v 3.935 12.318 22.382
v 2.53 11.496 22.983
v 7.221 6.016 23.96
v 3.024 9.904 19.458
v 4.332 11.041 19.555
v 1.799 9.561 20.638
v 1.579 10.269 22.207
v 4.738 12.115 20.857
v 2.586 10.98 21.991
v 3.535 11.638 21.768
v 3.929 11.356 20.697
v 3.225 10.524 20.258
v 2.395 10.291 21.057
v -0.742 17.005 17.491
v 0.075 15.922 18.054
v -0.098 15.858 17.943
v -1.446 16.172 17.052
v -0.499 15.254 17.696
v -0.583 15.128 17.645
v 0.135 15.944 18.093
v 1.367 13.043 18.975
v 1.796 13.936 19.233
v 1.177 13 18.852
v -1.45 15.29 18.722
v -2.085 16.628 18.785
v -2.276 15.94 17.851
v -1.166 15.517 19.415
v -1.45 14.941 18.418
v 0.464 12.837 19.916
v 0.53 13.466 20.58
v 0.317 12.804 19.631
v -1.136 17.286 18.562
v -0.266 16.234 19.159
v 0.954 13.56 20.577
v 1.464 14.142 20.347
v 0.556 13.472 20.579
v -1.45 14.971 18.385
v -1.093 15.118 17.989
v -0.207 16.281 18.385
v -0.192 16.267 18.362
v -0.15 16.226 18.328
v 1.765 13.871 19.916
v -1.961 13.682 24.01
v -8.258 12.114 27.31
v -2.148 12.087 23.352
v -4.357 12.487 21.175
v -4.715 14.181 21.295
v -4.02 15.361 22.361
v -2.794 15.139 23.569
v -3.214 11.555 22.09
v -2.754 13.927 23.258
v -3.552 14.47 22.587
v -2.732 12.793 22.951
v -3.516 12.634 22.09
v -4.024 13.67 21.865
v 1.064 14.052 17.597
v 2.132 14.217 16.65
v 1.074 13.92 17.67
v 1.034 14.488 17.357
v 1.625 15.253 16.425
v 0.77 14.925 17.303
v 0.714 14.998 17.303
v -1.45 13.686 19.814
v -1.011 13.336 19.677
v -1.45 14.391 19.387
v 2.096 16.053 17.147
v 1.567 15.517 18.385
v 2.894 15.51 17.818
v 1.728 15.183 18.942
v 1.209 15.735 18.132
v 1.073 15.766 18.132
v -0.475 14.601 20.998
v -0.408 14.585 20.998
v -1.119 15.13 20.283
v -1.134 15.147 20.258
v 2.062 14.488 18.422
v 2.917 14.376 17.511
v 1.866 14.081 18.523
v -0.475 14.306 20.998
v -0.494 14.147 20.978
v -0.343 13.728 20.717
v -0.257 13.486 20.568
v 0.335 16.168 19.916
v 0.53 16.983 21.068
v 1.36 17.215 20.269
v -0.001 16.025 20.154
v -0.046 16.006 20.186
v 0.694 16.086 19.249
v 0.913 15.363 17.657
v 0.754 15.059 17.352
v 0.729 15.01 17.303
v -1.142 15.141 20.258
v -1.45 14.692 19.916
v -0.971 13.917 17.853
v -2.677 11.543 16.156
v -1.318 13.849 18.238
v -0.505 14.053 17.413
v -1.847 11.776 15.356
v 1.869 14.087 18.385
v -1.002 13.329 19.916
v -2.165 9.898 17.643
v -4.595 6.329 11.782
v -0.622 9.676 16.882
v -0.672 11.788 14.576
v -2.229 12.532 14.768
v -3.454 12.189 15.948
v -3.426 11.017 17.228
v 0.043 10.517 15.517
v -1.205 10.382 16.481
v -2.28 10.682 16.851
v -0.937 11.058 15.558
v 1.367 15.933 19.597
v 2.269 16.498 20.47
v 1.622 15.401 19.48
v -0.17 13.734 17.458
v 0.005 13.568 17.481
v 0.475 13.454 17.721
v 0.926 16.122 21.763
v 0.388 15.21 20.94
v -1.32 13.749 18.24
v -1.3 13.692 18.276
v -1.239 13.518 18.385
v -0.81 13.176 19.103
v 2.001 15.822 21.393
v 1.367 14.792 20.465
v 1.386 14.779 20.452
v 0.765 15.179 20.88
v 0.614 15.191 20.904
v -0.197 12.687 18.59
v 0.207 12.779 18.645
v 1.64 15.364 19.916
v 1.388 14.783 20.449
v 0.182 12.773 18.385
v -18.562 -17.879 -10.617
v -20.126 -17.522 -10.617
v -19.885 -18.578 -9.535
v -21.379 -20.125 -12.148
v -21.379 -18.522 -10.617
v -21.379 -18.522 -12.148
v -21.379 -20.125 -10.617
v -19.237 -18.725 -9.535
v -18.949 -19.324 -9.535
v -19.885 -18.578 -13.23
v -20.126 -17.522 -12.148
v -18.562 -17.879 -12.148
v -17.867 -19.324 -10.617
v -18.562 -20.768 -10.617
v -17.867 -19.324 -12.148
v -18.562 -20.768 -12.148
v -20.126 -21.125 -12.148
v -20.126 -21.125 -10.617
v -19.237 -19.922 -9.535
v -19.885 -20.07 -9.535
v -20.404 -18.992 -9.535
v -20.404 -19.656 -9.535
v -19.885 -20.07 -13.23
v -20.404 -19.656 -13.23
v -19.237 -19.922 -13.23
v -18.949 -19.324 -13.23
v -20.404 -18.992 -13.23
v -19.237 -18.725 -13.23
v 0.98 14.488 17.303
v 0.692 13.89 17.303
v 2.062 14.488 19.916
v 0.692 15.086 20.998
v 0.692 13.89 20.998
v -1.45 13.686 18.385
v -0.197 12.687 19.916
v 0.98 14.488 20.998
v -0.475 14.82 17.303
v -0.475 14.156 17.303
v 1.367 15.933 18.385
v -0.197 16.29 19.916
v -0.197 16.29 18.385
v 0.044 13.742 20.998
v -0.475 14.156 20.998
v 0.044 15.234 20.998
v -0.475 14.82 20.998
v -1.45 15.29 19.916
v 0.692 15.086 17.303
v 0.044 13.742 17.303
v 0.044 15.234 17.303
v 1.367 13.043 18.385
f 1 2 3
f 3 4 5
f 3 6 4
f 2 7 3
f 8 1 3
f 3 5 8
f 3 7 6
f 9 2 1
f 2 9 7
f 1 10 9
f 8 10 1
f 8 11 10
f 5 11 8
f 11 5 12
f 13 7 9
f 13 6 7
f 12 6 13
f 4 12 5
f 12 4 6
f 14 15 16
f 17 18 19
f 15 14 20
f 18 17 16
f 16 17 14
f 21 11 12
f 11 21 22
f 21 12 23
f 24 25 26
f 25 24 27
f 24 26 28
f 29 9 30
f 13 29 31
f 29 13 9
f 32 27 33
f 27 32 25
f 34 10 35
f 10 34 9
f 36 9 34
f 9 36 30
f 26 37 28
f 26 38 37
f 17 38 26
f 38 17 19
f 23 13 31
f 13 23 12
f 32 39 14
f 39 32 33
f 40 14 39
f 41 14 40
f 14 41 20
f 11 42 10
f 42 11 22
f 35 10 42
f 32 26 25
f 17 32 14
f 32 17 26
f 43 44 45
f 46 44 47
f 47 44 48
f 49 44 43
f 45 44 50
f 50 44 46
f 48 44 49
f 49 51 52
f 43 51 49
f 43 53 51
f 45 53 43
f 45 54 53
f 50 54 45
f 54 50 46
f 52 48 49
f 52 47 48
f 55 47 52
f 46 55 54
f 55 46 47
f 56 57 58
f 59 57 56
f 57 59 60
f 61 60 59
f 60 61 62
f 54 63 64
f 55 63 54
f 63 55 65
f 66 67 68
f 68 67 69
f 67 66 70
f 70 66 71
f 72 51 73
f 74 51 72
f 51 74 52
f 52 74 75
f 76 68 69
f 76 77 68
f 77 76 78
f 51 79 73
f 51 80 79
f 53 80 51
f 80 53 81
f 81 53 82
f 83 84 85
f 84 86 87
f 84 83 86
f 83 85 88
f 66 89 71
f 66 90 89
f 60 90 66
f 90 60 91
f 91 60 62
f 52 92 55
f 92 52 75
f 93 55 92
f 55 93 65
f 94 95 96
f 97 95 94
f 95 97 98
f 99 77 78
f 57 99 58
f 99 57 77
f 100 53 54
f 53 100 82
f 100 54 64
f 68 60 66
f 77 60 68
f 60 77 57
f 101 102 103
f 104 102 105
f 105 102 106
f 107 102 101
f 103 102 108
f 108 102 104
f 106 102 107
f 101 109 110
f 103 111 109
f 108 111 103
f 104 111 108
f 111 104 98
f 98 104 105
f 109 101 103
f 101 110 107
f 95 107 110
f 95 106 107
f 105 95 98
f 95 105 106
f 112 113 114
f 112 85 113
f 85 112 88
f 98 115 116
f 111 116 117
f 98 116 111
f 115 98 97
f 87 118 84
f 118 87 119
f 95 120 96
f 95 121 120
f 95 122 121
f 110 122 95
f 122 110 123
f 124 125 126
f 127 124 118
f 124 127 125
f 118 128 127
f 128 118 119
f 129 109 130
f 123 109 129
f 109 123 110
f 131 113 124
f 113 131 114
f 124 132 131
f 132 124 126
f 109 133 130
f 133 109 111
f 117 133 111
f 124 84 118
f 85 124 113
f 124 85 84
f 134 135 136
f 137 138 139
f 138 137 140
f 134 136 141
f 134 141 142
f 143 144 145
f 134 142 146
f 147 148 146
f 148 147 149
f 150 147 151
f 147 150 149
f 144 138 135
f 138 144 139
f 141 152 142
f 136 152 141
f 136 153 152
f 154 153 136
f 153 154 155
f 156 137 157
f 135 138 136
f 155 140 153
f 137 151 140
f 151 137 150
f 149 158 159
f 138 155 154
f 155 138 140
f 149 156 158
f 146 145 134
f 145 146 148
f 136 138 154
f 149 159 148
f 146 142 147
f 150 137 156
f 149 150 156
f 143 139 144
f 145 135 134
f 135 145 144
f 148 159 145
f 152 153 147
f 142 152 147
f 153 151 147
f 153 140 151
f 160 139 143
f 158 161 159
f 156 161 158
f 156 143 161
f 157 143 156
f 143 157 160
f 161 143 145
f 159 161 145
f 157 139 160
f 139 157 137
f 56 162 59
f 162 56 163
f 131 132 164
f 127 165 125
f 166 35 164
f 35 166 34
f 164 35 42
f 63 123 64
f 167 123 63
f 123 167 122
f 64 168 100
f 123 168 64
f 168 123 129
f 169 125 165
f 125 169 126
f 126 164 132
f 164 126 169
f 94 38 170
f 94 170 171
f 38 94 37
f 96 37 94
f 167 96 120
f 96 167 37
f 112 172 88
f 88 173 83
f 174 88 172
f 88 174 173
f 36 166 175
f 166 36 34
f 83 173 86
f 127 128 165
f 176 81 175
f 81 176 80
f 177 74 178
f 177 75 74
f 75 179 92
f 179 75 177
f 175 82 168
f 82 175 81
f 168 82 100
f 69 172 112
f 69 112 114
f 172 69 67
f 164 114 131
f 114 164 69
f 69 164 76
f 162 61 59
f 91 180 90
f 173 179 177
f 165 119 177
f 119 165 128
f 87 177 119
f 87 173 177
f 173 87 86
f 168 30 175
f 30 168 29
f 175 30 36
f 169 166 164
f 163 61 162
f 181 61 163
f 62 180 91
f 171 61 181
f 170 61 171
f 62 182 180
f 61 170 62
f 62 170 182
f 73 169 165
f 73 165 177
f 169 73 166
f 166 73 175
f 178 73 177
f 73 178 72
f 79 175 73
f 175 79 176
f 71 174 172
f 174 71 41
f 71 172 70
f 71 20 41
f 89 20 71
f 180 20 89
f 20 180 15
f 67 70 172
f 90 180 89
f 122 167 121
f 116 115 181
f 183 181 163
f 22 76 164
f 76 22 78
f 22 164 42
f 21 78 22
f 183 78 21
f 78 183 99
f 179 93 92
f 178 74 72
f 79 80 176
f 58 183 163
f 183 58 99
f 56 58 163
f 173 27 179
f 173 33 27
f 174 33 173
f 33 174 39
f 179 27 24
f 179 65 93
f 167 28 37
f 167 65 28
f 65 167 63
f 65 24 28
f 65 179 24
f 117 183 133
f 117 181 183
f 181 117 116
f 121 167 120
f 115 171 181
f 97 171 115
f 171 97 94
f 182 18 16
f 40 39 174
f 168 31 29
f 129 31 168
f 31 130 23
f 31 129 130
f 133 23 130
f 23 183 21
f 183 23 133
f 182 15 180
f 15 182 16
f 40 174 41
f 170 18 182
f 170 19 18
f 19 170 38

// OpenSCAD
Lookatpoint=[rnd(-20,20),rnd(-20,20),rnd(-20,20)];
Origin=[rnd(-20,20),rnd(-20,20),rnd(-20,20)];
translate(Lookatpoint)color("red")sphere(2);
translate(Origin)color("blue")sphere(2);
translate(Origin)look_at(Lookatpoint ,Origin ){
    
arrow();
}

module arrow ()
{

color ("red")look_at([1,0,0]){
translate([0,0,5])cylinder(7,2,0);
translate([0,0,-3])cylinder(9,1,1);
 }
 
color ("green")look_at([0,1,0]){
translate([0,0,5])cylinder(7,2,0);
translate([0,0,-3])cylinder(9,1,1);
 }
 
color ("blue")look_at([0,0,1]){
translate([0,0,5])cylinder(7,2,0);
translate([0,0,-3])cylinder(9,1,1);
 }
    }



module look_at(lookpoint,origin=[0,0,0],rotatefrom=[0,0,1]){
rotations=look_at(lookpoint,origin ,rotatefrom);
rotate(rotations[0],rotations[1]) children();
}
function look_at(p,o=[0,0,0],up=[0,0,1])=let(a=up,b=p-o,c=cross(a,b) ,d=angle(a,b))[d,c];

function angle (a,b)=atan2(sqrt((cross(a, b)*cross(a, b))), (a* b));


function rnd(a = 1, b = 0, s = []) =
s == [] ?
  (rands(min(a, b), max(
    a, b), 1)[0]) :
  (rands(min(a, b), max(a, b), 1, s)[0]);
